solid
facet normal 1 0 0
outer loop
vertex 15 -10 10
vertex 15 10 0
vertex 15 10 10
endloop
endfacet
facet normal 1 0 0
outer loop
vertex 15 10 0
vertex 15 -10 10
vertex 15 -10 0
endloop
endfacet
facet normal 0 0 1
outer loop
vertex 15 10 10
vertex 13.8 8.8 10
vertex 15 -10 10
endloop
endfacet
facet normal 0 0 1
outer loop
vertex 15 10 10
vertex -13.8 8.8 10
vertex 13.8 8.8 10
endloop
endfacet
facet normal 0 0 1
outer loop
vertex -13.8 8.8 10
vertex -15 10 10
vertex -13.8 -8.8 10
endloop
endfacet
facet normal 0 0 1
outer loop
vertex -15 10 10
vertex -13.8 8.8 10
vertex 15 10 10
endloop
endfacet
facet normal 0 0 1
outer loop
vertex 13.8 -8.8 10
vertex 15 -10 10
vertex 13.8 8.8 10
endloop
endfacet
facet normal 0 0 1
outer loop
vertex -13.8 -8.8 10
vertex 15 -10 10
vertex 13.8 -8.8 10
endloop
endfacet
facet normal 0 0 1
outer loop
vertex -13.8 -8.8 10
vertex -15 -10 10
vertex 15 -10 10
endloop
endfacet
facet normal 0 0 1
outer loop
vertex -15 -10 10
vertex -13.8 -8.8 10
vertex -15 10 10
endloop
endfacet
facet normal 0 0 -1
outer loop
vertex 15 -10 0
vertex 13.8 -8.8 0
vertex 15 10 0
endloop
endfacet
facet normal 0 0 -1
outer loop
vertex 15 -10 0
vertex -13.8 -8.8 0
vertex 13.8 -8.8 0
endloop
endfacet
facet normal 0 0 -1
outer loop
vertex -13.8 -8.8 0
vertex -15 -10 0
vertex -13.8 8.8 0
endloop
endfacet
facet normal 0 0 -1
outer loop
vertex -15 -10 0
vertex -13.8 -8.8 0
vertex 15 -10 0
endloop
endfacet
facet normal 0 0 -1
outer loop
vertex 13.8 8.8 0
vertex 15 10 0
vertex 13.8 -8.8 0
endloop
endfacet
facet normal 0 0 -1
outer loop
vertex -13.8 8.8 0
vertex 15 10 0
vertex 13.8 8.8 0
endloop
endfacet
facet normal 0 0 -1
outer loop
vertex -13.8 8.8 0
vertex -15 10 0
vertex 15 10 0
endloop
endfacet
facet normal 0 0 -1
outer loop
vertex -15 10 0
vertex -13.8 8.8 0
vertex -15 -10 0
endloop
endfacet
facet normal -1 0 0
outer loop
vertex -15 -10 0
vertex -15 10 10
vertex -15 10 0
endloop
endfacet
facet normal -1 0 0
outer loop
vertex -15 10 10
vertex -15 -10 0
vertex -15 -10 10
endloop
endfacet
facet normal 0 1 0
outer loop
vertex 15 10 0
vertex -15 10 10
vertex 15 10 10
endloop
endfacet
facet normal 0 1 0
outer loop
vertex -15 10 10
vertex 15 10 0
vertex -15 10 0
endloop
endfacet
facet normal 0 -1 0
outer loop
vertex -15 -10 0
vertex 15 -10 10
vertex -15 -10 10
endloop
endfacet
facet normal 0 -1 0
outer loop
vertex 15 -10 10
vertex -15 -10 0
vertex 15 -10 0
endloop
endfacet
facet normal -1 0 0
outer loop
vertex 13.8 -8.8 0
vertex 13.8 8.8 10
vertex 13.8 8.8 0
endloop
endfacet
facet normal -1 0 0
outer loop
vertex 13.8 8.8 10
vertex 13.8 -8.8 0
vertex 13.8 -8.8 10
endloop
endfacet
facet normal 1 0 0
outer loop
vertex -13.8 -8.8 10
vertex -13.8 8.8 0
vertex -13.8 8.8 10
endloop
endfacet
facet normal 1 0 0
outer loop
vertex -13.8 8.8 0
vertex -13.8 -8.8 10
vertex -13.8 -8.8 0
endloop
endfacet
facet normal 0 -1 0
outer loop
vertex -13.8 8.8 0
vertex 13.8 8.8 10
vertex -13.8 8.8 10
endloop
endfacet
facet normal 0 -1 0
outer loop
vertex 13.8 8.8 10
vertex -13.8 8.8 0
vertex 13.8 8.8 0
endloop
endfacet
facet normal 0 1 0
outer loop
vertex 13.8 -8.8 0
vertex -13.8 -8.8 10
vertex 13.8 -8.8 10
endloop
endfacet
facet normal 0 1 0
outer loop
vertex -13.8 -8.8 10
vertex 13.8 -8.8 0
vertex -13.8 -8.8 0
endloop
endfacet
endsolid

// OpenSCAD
dx=30;
dy=20;
wall=1.2;
h = 10;

difference() {
translate([-dx/2, -dy/2, 0])
cube([dx, dy, h]);
  
  translate([-dx/2+wall, -dy/2+wall, -0.01])
  cube([dx-2*wall, dy-2*wall, h+0.02]);
}
